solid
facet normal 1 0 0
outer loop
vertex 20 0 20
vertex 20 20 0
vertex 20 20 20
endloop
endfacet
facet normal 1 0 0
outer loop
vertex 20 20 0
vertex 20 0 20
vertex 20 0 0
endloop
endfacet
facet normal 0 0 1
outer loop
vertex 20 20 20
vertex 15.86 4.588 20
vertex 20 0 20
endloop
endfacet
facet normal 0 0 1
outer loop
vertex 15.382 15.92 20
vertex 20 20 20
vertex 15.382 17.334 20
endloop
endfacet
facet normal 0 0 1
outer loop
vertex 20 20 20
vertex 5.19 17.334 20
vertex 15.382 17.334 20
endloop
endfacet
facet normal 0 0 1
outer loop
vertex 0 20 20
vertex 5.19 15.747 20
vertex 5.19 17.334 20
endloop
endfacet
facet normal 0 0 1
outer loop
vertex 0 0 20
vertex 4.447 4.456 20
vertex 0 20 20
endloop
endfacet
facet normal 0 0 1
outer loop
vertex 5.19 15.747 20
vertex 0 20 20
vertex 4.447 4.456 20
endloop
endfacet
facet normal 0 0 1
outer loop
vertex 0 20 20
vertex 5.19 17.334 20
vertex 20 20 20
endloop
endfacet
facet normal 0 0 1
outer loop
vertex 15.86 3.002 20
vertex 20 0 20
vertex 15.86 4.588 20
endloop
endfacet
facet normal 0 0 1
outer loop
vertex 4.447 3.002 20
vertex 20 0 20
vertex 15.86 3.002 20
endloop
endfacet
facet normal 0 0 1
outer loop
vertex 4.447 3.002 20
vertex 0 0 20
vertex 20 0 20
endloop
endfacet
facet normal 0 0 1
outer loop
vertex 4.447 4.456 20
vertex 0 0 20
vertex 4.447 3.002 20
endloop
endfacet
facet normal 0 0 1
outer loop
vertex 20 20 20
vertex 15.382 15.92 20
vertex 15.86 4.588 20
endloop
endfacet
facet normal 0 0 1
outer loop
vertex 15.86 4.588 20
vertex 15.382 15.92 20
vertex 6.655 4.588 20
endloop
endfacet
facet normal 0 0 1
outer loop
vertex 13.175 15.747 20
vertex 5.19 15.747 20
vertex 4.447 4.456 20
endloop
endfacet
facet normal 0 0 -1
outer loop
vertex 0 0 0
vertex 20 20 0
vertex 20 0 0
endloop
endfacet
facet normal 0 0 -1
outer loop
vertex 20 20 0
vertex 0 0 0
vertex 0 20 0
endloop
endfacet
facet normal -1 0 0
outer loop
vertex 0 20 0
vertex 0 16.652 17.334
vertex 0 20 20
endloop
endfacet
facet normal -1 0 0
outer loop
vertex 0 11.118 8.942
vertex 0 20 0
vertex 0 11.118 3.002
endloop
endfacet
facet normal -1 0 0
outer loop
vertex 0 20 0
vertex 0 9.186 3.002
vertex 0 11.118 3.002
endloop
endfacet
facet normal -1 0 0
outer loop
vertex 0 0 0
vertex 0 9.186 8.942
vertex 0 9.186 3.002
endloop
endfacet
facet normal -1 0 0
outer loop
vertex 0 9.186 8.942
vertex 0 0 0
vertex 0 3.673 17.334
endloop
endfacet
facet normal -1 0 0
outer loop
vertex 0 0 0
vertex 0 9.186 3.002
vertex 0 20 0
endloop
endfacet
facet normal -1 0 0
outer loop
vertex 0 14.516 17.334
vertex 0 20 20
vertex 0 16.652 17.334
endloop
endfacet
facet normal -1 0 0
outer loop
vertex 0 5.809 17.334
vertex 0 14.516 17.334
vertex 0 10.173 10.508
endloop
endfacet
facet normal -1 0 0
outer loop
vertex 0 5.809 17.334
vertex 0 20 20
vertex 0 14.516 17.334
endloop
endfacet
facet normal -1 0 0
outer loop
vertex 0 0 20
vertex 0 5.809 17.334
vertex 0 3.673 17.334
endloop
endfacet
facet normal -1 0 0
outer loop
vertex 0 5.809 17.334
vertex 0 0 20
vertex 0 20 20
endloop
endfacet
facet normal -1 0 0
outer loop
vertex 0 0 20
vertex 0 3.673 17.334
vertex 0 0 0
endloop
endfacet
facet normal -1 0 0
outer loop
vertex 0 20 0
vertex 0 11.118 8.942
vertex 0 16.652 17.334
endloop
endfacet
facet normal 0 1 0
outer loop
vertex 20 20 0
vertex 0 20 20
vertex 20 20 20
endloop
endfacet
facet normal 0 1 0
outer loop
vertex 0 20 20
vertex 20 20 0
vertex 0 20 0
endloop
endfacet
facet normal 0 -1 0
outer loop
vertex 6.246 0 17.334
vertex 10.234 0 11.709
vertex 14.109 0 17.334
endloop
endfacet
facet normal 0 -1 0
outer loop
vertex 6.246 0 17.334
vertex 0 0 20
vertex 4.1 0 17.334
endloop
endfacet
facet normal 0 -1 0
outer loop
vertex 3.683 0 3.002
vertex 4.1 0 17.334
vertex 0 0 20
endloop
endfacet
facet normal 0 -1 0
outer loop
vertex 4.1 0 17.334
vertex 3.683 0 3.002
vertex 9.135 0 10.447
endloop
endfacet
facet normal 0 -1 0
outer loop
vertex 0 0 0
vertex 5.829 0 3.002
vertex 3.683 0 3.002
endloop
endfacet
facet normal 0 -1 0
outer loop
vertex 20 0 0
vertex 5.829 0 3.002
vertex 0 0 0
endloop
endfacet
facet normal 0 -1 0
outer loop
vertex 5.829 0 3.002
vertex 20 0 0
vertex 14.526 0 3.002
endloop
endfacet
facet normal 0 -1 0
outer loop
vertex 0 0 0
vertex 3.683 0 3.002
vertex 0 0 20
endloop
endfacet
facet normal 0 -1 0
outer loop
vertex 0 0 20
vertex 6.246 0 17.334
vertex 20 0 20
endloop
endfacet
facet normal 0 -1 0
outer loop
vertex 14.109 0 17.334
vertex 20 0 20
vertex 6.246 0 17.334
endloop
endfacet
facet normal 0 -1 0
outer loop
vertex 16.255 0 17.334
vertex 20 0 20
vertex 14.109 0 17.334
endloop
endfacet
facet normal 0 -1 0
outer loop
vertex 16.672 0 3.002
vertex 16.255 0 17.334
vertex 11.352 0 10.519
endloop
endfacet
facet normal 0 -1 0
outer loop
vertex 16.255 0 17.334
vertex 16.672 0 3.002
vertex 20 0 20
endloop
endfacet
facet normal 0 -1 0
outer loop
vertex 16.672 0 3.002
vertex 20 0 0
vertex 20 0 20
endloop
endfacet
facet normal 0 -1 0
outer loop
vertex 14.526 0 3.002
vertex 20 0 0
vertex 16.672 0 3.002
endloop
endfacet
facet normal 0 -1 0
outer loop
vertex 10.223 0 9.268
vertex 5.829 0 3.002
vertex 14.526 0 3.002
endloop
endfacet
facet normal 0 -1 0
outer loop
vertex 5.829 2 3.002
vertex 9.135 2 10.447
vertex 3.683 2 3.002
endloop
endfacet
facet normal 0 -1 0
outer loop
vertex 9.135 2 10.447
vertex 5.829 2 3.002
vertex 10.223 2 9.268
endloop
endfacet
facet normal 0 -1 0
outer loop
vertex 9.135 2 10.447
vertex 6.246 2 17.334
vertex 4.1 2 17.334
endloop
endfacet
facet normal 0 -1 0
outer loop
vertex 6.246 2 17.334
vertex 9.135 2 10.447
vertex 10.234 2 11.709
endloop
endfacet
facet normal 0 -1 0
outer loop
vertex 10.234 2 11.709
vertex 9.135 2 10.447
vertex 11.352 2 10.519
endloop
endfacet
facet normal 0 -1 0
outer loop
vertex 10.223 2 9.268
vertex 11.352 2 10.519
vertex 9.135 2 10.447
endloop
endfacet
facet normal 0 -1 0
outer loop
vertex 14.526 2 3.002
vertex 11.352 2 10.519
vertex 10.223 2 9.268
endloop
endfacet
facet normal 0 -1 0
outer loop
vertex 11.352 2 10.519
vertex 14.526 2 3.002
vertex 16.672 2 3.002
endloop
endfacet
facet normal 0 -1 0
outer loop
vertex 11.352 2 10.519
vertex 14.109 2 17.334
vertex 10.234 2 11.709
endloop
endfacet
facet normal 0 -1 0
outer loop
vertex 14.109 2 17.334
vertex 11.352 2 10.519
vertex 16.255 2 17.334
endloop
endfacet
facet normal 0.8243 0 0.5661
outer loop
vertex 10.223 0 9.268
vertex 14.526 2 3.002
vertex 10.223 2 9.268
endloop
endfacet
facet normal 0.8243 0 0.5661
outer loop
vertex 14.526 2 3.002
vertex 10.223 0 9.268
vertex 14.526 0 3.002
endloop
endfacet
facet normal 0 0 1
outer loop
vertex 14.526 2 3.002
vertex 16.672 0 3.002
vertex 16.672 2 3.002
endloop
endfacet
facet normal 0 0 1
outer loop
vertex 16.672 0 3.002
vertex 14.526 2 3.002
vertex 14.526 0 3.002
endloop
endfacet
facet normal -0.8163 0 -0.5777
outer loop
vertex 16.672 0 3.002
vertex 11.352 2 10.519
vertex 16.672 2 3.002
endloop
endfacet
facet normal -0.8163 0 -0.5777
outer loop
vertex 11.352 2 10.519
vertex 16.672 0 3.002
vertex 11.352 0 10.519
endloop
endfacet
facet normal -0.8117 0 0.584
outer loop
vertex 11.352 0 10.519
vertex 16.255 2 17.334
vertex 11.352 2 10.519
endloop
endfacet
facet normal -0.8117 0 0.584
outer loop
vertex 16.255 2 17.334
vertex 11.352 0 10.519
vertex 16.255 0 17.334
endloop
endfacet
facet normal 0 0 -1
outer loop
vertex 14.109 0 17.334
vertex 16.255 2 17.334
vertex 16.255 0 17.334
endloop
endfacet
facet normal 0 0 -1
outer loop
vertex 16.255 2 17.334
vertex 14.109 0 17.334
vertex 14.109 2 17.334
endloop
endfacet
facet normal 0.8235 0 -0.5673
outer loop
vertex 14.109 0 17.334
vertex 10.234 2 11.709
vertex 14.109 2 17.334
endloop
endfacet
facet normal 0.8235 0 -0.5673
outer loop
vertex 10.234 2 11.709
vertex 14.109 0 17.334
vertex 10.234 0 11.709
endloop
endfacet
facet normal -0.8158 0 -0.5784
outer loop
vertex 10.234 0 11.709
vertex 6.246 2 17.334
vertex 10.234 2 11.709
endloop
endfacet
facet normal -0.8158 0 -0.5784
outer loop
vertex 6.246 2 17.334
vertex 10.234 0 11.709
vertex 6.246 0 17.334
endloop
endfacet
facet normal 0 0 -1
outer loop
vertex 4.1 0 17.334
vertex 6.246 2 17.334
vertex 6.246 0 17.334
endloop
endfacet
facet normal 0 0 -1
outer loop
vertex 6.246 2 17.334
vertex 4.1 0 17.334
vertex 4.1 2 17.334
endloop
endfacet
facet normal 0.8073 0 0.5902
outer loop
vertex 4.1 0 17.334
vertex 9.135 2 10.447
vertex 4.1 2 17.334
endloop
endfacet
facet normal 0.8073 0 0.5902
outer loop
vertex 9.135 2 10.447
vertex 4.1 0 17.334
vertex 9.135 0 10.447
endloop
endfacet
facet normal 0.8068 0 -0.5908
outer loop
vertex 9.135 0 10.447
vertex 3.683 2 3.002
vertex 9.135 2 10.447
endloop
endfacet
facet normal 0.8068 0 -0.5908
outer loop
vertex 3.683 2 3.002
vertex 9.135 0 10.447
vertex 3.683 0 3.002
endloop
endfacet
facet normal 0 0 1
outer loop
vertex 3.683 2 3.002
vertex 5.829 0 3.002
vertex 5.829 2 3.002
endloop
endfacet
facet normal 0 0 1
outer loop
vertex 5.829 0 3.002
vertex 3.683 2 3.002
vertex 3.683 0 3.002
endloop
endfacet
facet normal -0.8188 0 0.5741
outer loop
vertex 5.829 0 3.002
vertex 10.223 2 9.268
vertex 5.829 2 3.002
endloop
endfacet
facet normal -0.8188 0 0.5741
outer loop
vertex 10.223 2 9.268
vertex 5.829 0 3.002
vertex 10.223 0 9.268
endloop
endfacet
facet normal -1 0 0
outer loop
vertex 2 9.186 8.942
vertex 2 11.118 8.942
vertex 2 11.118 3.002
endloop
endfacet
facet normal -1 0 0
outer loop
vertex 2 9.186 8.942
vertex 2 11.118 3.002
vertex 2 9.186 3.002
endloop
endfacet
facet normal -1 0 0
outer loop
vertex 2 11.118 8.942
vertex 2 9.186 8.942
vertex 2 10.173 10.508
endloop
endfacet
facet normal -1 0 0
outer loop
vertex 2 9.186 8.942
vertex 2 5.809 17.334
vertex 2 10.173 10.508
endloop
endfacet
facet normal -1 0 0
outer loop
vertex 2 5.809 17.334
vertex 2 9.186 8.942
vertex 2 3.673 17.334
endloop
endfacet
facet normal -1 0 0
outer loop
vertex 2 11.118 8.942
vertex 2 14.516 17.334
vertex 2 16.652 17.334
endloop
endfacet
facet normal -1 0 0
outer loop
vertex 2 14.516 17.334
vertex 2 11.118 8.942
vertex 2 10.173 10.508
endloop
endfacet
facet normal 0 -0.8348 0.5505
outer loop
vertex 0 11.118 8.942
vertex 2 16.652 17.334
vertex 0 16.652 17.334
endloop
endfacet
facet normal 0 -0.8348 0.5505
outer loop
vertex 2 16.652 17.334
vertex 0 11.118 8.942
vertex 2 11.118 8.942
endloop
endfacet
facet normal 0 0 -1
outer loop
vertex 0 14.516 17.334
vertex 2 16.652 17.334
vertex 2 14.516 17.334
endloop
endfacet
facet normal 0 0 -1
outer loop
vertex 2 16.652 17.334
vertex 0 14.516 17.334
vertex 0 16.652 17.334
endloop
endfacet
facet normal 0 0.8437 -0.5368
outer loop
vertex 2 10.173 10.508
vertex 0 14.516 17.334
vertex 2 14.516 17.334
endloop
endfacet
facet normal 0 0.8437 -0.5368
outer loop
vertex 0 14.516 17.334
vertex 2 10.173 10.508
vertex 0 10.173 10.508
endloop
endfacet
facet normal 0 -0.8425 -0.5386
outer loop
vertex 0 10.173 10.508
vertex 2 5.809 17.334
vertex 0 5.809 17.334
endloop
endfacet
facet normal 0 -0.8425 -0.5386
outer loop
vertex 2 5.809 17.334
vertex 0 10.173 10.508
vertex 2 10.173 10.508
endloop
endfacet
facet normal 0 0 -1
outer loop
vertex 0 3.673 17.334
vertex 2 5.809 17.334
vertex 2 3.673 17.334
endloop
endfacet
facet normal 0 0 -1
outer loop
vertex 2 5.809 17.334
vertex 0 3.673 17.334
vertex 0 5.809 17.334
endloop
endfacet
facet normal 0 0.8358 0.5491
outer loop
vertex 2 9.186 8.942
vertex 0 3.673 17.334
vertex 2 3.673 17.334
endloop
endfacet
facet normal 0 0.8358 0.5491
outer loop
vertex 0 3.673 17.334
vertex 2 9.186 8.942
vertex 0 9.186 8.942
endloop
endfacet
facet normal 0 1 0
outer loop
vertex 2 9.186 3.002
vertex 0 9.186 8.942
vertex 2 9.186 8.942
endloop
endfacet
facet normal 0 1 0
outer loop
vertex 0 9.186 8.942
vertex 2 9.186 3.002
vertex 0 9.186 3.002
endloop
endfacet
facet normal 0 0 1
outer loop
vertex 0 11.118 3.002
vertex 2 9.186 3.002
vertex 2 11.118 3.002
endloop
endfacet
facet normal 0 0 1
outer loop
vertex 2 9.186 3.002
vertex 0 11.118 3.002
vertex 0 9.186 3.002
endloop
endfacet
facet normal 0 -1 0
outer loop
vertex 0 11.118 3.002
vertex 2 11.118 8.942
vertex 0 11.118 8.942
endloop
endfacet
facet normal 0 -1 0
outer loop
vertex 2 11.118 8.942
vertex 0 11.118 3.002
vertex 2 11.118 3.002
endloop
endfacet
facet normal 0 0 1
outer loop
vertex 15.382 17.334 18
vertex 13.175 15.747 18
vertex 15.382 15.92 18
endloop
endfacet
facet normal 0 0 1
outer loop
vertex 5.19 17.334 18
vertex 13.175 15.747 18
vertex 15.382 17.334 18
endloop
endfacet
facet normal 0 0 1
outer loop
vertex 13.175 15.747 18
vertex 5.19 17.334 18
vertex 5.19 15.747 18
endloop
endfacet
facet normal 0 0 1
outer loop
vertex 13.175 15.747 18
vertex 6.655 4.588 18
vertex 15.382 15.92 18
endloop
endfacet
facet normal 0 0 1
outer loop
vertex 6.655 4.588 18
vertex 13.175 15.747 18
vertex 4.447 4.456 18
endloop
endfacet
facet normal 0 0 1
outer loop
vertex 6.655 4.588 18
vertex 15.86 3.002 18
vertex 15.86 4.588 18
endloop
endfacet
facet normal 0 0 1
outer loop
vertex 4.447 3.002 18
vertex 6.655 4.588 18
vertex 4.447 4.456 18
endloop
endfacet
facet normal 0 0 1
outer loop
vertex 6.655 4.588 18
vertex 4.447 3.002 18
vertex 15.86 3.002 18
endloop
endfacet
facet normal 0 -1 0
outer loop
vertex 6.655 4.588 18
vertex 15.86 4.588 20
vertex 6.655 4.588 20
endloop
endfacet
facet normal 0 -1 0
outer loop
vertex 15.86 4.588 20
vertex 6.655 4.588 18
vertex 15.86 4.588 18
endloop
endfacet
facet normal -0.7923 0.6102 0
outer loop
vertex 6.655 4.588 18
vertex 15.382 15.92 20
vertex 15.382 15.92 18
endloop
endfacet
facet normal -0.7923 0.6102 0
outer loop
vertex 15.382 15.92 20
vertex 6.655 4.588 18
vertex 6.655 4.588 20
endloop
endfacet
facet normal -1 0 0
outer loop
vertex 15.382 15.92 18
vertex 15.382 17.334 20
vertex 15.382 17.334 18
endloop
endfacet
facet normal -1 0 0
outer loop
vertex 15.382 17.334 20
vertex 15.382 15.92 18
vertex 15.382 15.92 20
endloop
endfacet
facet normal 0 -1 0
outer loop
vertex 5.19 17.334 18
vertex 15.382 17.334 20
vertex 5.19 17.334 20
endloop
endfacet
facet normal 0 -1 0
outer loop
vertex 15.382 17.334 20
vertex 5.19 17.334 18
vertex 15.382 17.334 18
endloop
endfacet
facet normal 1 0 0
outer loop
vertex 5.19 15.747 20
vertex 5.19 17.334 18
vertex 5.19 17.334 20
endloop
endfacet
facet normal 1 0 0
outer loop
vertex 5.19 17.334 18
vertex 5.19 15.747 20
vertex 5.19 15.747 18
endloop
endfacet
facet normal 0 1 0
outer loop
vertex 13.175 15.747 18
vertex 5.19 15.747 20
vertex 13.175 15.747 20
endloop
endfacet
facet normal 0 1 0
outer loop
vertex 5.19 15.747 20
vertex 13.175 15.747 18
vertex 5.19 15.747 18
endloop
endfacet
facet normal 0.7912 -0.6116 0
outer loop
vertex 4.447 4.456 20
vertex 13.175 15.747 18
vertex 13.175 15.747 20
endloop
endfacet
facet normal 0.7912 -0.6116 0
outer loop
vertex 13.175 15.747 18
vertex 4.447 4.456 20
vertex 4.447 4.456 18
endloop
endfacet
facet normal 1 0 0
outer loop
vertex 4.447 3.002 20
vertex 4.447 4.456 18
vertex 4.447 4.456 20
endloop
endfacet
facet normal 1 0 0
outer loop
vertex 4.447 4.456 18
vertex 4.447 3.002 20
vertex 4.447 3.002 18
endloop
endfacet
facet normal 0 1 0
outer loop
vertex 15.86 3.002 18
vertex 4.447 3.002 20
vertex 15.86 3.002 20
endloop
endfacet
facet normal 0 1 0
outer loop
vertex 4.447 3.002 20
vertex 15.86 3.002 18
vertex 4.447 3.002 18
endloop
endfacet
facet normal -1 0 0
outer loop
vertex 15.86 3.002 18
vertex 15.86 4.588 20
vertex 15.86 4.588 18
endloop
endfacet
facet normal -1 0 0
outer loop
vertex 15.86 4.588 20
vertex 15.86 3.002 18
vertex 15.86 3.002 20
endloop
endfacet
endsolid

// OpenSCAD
eps=0.01;
depth=2;
side = 20;
size = side*[1,1,1];
font_size = 15;

difference()
{
  cube(size);
  translate([size[0]/2, depth, size[2]/2])
    rotate([90,0,0])
      linear_extrude(height=depth+eps)
        text("X", size=font_size, valign="center", halign="center");
  translate([-eps, size[1]/2, size[2]/2])
    rotate([90,0,90])
      linear_extrude(height=depth+eps)
        text("Y", size=font_size, valign="center", halign="center");
  translate([size[0]/2, size[1]/2, size[2]-depth])
    linear_extrude(height=depth+eps)
      text("Z", size=font_size, valign="center", halign="center");
}
